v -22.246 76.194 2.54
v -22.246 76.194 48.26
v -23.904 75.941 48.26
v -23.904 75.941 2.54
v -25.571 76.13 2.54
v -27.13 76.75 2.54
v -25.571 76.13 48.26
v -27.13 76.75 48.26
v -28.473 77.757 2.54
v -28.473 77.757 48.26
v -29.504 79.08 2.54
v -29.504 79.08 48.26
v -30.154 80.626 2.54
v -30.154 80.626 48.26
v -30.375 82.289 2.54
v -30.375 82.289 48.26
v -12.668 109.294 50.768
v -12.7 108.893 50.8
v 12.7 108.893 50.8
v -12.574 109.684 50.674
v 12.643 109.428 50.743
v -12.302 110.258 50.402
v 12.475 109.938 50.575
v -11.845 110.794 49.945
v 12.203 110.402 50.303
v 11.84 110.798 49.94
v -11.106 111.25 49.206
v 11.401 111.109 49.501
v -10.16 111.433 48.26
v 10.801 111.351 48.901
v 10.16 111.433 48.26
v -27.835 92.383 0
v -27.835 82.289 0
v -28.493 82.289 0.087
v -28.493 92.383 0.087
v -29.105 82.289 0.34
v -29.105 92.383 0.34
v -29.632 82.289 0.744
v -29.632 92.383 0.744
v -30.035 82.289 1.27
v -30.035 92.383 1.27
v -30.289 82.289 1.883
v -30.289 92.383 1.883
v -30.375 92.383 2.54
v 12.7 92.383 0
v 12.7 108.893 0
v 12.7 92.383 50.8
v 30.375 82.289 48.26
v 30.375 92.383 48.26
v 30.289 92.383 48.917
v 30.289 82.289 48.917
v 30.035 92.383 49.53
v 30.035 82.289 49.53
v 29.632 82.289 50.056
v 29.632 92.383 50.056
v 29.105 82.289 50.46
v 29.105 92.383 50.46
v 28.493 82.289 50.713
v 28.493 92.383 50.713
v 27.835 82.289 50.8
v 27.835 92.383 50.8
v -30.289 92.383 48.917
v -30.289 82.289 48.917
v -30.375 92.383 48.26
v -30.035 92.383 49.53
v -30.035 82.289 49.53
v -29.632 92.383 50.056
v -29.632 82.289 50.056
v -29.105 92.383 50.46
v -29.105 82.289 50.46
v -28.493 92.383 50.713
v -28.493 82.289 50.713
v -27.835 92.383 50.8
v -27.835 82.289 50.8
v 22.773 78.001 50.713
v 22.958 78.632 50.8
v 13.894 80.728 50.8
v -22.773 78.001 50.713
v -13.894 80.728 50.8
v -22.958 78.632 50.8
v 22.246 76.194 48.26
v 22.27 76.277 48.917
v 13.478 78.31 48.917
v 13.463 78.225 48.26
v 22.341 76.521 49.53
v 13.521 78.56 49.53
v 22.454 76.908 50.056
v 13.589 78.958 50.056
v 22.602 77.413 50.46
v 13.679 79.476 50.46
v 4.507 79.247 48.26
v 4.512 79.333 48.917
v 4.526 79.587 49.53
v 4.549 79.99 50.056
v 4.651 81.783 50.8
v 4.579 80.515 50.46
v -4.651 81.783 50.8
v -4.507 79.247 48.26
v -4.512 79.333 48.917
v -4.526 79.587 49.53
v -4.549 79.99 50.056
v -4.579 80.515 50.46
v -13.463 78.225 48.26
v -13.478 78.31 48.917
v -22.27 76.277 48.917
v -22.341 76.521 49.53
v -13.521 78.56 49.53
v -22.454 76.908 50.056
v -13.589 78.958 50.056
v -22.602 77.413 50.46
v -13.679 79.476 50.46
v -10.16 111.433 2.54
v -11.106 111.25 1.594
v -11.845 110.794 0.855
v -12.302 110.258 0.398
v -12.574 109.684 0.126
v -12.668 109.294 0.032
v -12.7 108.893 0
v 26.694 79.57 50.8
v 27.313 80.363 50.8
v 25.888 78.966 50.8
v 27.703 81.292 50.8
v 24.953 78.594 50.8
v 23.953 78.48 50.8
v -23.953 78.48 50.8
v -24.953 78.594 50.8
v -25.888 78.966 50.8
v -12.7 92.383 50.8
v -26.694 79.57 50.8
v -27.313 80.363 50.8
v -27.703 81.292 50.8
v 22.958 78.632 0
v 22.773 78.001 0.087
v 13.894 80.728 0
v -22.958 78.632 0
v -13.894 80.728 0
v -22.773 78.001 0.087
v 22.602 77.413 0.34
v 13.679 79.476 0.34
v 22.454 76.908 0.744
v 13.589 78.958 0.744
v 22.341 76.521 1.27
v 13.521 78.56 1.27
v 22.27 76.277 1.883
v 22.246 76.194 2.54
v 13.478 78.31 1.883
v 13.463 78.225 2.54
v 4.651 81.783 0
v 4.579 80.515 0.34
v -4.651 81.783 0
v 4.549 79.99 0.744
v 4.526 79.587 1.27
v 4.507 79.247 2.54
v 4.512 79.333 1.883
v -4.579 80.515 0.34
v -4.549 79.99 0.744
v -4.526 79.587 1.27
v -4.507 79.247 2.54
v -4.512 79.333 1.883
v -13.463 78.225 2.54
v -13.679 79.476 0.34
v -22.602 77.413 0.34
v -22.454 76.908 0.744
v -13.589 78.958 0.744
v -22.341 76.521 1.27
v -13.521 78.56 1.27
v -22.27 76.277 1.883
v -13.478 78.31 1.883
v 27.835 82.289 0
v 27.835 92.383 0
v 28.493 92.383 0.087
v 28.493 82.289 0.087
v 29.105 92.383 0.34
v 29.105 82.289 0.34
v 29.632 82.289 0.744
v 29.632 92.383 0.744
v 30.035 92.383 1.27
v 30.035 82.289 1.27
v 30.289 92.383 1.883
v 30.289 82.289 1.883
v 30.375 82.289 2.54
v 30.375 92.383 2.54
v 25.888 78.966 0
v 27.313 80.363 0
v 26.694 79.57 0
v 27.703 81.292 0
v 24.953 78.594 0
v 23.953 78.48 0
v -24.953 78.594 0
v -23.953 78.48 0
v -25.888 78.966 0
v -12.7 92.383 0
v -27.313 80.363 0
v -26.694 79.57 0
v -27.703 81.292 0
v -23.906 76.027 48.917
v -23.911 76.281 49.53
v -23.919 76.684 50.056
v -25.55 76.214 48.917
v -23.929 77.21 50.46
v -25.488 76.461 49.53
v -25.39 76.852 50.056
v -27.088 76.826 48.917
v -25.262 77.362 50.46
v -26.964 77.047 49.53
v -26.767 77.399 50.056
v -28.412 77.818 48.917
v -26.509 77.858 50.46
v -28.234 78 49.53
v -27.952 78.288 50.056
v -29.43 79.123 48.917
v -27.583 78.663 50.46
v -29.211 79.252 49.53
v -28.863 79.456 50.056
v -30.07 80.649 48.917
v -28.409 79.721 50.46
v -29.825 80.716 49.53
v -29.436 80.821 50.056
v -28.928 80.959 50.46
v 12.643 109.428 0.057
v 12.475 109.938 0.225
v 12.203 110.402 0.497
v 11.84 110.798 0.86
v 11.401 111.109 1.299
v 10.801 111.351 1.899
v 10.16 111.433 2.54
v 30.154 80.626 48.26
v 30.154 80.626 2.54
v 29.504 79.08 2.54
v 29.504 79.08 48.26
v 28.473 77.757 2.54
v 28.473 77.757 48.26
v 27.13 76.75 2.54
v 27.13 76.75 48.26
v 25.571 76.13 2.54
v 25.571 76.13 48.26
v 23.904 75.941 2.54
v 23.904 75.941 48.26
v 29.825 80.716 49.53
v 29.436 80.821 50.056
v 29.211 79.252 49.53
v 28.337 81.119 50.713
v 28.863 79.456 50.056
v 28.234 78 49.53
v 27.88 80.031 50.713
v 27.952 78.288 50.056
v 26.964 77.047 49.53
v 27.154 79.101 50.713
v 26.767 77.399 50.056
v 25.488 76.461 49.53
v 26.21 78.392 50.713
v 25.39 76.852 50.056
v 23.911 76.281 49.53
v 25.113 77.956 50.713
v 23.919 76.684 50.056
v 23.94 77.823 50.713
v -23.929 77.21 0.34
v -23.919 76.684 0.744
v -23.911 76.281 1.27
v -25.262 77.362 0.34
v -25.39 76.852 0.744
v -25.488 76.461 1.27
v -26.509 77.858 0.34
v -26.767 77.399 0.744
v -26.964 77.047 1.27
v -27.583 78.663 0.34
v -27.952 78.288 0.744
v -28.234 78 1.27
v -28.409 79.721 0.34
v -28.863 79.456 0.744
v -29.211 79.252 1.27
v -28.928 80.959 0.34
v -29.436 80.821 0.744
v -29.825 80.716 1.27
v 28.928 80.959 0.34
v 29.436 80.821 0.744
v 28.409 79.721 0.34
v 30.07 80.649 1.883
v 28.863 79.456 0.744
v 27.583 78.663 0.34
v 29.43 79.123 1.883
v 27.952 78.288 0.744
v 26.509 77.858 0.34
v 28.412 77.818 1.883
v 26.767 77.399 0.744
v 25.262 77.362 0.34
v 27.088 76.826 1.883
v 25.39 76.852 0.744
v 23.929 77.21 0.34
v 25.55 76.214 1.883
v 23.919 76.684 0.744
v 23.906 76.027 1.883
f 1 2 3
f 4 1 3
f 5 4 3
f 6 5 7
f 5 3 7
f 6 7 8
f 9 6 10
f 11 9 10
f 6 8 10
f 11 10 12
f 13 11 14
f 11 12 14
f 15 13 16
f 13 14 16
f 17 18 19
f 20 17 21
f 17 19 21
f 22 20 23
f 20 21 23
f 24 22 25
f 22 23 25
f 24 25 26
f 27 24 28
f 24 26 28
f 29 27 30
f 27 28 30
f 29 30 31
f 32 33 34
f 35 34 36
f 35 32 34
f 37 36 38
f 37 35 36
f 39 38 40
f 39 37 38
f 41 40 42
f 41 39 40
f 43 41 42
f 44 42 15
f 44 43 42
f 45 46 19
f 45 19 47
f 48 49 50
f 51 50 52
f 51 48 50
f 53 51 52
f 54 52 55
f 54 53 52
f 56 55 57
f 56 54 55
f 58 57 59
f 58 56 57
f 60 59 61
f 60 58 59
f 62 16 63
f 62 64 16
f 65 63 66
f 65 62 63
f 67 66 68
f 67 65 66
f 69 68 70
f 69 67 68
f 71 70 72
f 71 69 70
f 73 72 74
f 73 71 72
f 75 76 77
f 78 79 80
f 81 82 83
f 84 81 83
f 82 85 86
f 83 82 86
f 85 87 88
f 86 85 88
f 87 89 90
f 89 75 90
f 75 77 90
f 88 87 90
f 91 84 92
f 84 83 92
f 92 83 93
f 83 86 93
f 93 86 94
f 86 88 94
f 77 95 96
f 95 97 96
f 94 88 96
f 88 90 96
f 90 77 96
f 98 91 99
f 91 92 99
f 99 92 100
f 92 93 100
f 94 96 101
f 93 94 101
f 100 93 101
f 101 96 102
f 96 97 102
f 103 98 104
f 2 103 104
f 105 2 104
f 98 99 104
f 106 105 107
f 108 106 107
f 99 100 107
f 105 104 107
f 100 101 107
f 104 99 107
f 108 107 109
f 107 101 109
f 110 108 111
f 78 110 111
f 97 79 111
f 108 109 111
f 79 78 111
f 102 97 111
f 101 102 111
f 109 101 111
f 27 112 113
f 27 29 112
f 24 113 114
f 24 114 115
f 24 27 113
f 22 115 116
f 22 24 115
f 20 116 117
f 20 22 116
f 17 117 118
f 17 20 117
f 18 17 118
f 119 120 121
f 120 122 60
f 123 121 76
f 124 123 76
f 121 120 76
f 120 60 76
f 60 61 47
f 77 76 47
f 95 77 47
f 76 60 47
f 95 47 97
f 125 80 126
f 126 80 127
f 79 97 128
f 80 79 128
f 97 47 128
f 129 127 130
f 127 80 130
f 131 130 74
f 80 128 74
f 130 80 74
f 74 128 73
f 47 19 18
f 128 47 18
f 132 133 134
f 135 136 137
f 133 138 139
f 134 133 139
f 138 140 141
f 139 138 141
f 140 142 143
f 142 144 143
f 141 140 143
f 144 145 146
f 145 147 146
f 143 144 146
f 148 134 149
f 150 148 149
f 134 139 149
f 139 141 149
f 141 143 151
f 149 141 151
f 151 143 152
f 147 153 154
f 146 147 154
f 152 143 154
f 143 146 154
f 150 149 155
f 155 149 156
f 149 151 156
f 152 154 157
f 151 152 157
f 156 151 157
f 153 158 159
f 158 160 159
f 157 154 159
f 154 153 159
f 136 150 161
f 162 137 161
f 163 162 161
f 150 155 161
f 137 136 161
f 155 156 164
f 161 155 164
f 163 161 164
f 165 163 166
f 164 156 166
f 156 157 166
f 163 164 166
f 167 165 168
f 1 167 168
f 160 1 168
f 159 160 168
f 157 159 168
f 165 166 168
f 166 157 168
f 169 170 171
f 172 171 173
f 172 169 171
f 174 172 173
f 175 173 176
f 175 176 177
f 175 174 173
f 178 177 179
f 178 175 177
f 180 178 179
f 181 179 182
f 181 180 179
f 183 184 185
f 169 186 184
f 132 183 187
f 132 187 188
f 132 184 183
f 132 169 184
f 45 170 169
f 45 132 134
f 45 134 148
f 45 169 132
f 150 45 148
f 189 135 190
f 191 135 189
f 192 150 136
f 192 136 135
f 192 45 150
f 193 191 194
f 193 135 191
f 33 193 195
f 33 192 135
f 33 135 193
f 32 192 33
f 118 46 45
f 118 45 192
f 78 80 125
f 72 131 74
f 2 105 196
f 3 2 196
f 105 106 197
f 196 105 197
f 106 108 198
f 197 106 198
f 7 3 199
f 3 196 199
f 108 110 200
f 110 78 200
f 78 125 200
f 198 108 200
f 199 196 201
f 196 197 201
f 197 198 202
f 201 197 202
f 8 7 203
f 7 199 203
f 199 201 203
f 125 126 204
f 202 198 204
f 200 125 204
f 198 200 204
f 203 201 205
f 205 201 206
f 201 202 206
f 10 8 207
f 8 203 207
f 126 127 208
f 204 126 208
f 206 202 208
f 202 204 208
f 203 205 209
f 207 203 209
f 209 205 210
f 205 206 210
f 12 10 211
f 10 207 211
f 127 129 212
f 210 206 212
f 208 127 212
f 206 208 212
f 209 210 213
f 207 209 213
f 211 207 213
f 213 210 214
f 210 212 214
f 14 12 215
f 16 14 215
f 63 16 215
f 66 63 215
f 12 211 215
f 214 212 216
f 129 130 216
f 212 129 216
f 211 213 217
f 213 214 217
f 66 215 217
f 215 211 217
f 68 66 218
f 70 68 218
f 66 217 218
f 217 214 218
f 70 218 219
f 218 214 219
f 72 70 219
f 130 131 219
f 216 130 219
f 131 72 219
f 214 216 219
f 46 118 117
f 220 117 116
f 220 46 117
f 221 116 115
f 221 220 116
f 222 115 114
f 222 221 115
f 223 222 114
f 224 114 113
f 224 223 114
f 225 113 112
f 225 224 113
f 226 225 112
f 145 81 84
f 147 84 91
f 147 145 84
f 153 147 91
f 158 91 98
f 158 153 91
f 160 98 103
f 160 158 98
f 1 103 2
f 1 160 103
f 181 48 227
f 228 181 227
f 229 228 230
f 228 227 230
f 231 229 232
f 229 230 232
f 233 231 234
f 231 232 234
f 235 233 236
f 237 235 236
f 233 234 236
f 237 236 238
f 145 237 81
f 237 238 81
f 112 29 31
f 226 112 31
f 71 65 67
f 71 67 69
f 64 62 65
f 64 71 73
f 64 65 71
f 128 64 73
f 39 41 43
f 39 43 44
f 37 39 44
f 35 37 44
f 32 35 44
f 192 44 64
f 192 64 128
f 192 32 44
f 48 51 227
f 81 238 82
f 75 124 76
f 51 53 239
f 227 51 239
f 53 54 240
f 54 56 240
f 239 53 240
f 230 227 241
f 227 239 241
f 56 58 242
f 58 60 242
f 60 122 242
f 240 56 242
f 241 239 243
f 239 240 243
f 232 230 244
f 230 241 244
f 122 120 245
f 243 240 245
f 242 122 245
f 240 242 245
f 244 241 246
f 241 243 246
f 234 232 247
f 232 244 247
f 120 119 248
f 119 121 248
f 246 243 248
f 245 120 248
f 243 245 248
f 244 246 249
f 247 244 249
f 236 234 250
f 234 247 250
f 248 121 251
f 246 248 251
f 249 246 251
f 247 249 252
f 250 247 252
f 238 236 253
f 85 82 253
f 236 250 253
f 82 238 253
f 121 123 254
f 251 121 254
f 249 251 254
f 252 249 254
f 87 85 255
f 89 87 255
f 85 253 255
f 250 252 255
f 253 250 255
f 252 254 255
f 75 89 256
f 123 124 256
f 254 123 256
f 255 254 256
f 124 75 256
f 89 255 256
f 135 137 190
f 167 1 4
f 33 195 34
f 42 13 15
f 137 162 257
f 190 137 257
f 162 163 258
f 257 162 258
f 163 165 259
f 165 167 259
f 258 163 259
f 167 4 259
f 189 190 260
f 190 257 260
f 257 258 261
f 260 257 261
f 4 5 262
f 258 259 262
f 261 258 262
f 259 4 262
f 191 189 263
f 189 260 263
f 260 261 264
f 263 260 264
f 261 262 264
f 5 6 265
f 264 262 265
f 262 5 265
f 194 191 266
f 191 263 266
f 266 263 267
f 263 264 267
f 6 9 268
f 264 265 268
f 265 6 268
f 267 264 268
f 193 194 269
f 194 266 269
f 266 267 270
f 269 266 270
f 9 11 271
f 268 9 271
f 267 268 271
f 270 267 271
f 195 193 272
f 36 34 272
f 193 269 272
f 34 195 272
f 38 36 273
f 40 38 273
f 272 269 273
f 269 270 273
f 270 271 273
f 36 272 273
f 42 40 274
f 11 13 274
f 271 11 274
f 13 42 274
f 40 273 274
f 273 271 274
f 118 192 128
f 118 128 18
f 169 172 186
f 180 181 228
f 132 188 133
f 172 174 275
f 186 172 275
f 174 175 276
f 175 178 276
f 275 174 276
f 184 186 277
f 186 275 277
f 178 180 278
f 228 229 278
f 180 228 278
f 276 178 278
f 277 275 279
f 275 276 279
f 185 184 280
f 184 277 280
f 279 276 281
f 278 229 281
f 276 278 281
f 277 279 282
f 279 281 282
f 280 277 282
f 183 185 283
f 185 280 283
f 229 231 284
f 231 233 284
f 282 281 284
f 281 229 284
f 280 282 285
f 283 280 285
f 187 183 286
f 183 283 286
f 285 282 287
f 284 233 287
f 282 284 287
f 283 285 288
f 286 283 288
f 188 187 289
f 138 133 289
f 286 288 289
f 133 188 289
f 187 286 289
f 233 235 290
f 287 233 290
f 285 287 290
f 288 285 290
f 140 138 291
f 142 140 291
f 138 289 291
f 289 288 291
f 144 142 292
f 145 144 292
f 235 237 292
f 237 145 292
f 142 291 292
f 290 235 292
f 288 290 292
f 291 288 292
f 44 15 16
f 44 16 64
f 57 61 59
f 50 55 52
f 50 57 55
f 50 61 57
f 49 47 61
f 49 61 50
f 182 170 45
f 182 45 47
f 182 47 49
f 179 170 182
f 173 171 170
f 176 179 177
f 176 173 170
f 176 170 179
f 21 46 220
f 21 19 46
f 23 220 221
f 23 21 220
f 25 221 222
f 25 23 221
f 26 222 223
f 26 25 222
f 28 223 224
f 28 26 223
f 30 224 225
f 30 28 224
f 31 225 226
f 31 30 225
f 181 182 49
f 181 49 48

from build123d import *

# Parameters (mm, degrees)
BOSS_EXTRUDE1_DEPTH = 50.8
FILLET1_R           = 6.35
FILLET3_R           = 2.54
FILLET4_R           = 2.54
FILLET5_R           = 2.54


with BuildPart() as part:
    # Sketch1 → Boss-Extrude1 (new body)
    with BuildSketch(Plane.XY):
        with BuildLine():
            Line((-12.7, 111.432937893), (12.7, 111.432937893))
            Line((12.7, 111.432937893), (12.7, 92.382937893))
            Line((12.7, 92.382937893), (30.375497444, 92.382937893))
            Line((30.375497444, 92.382937893), (30.375497444, 73.332937893))
            ThreePointArc((30.375497444, 73.332937893), (0, 79.375), (-30.375497444, 73.332937893))
            Line((-30.375497444, 73.332937893), (-30.375497444, 92.382937893))
            Line((-30.375497444, 92.382937893), (-12.7, 92.382937893))
            Line((-12.7, 92.382937893), (-12.7, 111.432937893))
        make_face()
    extrude(amount=BOSS_EXTRUDE1_DEPTH)

    # Fillet1
    fillet1_edges = [part.edges().sort_by_distance(p)[0] for p in [
        (30.375497444, 73.332937893, 25.4),
        (-30.375497444, 73.332937893, 25.4),
    ]]
    fillet(fillet1_edges, radius=FILLET1_R)

    # Fillet3
    fillet3_edges = [part.edges().sort_by_distance(p)[0] for p in [
        (-12.7, 111.432937893, 25.4),
        (12.7, 111.432937893, 25.4),
        (0, 111.432937893, 50.8),
        (0, 111.432937893, 0),
    ]]
    fillet(fillet3_edges, radius=FILLET3_R)

    # Fillet4
    fillet4_edges = [part.edges().sort_by_distance(p)[0] for p in [
        (0, 79.375, 50.8),
        (30.375497444, 87.336186401, 50.8),
        (27.834803015, 77.208914161, 50.8),
        (-27.834803015, 77.208914161, 50.8),
        (-30.375497444, 87.336186401, 50.8),
    ]]
    fillet(fillet4_edges, radius=FILLET4_R)

    # Fillet5
    fillet5_edges = [part.edges().sort_by_distance(p)[0] for p in [
        (-30.375497444, 87.336186401, 0),
        (0, 79.375, 0),
        (30.375497444, 87.336186401, 0),
        (27.834803015, 77.208914161, 0),
        (-27.834803015, 77.208914161, 0),
    ]]
    fillet(fillet5_edges, radius=FILLET5_R)


solid = part.part
